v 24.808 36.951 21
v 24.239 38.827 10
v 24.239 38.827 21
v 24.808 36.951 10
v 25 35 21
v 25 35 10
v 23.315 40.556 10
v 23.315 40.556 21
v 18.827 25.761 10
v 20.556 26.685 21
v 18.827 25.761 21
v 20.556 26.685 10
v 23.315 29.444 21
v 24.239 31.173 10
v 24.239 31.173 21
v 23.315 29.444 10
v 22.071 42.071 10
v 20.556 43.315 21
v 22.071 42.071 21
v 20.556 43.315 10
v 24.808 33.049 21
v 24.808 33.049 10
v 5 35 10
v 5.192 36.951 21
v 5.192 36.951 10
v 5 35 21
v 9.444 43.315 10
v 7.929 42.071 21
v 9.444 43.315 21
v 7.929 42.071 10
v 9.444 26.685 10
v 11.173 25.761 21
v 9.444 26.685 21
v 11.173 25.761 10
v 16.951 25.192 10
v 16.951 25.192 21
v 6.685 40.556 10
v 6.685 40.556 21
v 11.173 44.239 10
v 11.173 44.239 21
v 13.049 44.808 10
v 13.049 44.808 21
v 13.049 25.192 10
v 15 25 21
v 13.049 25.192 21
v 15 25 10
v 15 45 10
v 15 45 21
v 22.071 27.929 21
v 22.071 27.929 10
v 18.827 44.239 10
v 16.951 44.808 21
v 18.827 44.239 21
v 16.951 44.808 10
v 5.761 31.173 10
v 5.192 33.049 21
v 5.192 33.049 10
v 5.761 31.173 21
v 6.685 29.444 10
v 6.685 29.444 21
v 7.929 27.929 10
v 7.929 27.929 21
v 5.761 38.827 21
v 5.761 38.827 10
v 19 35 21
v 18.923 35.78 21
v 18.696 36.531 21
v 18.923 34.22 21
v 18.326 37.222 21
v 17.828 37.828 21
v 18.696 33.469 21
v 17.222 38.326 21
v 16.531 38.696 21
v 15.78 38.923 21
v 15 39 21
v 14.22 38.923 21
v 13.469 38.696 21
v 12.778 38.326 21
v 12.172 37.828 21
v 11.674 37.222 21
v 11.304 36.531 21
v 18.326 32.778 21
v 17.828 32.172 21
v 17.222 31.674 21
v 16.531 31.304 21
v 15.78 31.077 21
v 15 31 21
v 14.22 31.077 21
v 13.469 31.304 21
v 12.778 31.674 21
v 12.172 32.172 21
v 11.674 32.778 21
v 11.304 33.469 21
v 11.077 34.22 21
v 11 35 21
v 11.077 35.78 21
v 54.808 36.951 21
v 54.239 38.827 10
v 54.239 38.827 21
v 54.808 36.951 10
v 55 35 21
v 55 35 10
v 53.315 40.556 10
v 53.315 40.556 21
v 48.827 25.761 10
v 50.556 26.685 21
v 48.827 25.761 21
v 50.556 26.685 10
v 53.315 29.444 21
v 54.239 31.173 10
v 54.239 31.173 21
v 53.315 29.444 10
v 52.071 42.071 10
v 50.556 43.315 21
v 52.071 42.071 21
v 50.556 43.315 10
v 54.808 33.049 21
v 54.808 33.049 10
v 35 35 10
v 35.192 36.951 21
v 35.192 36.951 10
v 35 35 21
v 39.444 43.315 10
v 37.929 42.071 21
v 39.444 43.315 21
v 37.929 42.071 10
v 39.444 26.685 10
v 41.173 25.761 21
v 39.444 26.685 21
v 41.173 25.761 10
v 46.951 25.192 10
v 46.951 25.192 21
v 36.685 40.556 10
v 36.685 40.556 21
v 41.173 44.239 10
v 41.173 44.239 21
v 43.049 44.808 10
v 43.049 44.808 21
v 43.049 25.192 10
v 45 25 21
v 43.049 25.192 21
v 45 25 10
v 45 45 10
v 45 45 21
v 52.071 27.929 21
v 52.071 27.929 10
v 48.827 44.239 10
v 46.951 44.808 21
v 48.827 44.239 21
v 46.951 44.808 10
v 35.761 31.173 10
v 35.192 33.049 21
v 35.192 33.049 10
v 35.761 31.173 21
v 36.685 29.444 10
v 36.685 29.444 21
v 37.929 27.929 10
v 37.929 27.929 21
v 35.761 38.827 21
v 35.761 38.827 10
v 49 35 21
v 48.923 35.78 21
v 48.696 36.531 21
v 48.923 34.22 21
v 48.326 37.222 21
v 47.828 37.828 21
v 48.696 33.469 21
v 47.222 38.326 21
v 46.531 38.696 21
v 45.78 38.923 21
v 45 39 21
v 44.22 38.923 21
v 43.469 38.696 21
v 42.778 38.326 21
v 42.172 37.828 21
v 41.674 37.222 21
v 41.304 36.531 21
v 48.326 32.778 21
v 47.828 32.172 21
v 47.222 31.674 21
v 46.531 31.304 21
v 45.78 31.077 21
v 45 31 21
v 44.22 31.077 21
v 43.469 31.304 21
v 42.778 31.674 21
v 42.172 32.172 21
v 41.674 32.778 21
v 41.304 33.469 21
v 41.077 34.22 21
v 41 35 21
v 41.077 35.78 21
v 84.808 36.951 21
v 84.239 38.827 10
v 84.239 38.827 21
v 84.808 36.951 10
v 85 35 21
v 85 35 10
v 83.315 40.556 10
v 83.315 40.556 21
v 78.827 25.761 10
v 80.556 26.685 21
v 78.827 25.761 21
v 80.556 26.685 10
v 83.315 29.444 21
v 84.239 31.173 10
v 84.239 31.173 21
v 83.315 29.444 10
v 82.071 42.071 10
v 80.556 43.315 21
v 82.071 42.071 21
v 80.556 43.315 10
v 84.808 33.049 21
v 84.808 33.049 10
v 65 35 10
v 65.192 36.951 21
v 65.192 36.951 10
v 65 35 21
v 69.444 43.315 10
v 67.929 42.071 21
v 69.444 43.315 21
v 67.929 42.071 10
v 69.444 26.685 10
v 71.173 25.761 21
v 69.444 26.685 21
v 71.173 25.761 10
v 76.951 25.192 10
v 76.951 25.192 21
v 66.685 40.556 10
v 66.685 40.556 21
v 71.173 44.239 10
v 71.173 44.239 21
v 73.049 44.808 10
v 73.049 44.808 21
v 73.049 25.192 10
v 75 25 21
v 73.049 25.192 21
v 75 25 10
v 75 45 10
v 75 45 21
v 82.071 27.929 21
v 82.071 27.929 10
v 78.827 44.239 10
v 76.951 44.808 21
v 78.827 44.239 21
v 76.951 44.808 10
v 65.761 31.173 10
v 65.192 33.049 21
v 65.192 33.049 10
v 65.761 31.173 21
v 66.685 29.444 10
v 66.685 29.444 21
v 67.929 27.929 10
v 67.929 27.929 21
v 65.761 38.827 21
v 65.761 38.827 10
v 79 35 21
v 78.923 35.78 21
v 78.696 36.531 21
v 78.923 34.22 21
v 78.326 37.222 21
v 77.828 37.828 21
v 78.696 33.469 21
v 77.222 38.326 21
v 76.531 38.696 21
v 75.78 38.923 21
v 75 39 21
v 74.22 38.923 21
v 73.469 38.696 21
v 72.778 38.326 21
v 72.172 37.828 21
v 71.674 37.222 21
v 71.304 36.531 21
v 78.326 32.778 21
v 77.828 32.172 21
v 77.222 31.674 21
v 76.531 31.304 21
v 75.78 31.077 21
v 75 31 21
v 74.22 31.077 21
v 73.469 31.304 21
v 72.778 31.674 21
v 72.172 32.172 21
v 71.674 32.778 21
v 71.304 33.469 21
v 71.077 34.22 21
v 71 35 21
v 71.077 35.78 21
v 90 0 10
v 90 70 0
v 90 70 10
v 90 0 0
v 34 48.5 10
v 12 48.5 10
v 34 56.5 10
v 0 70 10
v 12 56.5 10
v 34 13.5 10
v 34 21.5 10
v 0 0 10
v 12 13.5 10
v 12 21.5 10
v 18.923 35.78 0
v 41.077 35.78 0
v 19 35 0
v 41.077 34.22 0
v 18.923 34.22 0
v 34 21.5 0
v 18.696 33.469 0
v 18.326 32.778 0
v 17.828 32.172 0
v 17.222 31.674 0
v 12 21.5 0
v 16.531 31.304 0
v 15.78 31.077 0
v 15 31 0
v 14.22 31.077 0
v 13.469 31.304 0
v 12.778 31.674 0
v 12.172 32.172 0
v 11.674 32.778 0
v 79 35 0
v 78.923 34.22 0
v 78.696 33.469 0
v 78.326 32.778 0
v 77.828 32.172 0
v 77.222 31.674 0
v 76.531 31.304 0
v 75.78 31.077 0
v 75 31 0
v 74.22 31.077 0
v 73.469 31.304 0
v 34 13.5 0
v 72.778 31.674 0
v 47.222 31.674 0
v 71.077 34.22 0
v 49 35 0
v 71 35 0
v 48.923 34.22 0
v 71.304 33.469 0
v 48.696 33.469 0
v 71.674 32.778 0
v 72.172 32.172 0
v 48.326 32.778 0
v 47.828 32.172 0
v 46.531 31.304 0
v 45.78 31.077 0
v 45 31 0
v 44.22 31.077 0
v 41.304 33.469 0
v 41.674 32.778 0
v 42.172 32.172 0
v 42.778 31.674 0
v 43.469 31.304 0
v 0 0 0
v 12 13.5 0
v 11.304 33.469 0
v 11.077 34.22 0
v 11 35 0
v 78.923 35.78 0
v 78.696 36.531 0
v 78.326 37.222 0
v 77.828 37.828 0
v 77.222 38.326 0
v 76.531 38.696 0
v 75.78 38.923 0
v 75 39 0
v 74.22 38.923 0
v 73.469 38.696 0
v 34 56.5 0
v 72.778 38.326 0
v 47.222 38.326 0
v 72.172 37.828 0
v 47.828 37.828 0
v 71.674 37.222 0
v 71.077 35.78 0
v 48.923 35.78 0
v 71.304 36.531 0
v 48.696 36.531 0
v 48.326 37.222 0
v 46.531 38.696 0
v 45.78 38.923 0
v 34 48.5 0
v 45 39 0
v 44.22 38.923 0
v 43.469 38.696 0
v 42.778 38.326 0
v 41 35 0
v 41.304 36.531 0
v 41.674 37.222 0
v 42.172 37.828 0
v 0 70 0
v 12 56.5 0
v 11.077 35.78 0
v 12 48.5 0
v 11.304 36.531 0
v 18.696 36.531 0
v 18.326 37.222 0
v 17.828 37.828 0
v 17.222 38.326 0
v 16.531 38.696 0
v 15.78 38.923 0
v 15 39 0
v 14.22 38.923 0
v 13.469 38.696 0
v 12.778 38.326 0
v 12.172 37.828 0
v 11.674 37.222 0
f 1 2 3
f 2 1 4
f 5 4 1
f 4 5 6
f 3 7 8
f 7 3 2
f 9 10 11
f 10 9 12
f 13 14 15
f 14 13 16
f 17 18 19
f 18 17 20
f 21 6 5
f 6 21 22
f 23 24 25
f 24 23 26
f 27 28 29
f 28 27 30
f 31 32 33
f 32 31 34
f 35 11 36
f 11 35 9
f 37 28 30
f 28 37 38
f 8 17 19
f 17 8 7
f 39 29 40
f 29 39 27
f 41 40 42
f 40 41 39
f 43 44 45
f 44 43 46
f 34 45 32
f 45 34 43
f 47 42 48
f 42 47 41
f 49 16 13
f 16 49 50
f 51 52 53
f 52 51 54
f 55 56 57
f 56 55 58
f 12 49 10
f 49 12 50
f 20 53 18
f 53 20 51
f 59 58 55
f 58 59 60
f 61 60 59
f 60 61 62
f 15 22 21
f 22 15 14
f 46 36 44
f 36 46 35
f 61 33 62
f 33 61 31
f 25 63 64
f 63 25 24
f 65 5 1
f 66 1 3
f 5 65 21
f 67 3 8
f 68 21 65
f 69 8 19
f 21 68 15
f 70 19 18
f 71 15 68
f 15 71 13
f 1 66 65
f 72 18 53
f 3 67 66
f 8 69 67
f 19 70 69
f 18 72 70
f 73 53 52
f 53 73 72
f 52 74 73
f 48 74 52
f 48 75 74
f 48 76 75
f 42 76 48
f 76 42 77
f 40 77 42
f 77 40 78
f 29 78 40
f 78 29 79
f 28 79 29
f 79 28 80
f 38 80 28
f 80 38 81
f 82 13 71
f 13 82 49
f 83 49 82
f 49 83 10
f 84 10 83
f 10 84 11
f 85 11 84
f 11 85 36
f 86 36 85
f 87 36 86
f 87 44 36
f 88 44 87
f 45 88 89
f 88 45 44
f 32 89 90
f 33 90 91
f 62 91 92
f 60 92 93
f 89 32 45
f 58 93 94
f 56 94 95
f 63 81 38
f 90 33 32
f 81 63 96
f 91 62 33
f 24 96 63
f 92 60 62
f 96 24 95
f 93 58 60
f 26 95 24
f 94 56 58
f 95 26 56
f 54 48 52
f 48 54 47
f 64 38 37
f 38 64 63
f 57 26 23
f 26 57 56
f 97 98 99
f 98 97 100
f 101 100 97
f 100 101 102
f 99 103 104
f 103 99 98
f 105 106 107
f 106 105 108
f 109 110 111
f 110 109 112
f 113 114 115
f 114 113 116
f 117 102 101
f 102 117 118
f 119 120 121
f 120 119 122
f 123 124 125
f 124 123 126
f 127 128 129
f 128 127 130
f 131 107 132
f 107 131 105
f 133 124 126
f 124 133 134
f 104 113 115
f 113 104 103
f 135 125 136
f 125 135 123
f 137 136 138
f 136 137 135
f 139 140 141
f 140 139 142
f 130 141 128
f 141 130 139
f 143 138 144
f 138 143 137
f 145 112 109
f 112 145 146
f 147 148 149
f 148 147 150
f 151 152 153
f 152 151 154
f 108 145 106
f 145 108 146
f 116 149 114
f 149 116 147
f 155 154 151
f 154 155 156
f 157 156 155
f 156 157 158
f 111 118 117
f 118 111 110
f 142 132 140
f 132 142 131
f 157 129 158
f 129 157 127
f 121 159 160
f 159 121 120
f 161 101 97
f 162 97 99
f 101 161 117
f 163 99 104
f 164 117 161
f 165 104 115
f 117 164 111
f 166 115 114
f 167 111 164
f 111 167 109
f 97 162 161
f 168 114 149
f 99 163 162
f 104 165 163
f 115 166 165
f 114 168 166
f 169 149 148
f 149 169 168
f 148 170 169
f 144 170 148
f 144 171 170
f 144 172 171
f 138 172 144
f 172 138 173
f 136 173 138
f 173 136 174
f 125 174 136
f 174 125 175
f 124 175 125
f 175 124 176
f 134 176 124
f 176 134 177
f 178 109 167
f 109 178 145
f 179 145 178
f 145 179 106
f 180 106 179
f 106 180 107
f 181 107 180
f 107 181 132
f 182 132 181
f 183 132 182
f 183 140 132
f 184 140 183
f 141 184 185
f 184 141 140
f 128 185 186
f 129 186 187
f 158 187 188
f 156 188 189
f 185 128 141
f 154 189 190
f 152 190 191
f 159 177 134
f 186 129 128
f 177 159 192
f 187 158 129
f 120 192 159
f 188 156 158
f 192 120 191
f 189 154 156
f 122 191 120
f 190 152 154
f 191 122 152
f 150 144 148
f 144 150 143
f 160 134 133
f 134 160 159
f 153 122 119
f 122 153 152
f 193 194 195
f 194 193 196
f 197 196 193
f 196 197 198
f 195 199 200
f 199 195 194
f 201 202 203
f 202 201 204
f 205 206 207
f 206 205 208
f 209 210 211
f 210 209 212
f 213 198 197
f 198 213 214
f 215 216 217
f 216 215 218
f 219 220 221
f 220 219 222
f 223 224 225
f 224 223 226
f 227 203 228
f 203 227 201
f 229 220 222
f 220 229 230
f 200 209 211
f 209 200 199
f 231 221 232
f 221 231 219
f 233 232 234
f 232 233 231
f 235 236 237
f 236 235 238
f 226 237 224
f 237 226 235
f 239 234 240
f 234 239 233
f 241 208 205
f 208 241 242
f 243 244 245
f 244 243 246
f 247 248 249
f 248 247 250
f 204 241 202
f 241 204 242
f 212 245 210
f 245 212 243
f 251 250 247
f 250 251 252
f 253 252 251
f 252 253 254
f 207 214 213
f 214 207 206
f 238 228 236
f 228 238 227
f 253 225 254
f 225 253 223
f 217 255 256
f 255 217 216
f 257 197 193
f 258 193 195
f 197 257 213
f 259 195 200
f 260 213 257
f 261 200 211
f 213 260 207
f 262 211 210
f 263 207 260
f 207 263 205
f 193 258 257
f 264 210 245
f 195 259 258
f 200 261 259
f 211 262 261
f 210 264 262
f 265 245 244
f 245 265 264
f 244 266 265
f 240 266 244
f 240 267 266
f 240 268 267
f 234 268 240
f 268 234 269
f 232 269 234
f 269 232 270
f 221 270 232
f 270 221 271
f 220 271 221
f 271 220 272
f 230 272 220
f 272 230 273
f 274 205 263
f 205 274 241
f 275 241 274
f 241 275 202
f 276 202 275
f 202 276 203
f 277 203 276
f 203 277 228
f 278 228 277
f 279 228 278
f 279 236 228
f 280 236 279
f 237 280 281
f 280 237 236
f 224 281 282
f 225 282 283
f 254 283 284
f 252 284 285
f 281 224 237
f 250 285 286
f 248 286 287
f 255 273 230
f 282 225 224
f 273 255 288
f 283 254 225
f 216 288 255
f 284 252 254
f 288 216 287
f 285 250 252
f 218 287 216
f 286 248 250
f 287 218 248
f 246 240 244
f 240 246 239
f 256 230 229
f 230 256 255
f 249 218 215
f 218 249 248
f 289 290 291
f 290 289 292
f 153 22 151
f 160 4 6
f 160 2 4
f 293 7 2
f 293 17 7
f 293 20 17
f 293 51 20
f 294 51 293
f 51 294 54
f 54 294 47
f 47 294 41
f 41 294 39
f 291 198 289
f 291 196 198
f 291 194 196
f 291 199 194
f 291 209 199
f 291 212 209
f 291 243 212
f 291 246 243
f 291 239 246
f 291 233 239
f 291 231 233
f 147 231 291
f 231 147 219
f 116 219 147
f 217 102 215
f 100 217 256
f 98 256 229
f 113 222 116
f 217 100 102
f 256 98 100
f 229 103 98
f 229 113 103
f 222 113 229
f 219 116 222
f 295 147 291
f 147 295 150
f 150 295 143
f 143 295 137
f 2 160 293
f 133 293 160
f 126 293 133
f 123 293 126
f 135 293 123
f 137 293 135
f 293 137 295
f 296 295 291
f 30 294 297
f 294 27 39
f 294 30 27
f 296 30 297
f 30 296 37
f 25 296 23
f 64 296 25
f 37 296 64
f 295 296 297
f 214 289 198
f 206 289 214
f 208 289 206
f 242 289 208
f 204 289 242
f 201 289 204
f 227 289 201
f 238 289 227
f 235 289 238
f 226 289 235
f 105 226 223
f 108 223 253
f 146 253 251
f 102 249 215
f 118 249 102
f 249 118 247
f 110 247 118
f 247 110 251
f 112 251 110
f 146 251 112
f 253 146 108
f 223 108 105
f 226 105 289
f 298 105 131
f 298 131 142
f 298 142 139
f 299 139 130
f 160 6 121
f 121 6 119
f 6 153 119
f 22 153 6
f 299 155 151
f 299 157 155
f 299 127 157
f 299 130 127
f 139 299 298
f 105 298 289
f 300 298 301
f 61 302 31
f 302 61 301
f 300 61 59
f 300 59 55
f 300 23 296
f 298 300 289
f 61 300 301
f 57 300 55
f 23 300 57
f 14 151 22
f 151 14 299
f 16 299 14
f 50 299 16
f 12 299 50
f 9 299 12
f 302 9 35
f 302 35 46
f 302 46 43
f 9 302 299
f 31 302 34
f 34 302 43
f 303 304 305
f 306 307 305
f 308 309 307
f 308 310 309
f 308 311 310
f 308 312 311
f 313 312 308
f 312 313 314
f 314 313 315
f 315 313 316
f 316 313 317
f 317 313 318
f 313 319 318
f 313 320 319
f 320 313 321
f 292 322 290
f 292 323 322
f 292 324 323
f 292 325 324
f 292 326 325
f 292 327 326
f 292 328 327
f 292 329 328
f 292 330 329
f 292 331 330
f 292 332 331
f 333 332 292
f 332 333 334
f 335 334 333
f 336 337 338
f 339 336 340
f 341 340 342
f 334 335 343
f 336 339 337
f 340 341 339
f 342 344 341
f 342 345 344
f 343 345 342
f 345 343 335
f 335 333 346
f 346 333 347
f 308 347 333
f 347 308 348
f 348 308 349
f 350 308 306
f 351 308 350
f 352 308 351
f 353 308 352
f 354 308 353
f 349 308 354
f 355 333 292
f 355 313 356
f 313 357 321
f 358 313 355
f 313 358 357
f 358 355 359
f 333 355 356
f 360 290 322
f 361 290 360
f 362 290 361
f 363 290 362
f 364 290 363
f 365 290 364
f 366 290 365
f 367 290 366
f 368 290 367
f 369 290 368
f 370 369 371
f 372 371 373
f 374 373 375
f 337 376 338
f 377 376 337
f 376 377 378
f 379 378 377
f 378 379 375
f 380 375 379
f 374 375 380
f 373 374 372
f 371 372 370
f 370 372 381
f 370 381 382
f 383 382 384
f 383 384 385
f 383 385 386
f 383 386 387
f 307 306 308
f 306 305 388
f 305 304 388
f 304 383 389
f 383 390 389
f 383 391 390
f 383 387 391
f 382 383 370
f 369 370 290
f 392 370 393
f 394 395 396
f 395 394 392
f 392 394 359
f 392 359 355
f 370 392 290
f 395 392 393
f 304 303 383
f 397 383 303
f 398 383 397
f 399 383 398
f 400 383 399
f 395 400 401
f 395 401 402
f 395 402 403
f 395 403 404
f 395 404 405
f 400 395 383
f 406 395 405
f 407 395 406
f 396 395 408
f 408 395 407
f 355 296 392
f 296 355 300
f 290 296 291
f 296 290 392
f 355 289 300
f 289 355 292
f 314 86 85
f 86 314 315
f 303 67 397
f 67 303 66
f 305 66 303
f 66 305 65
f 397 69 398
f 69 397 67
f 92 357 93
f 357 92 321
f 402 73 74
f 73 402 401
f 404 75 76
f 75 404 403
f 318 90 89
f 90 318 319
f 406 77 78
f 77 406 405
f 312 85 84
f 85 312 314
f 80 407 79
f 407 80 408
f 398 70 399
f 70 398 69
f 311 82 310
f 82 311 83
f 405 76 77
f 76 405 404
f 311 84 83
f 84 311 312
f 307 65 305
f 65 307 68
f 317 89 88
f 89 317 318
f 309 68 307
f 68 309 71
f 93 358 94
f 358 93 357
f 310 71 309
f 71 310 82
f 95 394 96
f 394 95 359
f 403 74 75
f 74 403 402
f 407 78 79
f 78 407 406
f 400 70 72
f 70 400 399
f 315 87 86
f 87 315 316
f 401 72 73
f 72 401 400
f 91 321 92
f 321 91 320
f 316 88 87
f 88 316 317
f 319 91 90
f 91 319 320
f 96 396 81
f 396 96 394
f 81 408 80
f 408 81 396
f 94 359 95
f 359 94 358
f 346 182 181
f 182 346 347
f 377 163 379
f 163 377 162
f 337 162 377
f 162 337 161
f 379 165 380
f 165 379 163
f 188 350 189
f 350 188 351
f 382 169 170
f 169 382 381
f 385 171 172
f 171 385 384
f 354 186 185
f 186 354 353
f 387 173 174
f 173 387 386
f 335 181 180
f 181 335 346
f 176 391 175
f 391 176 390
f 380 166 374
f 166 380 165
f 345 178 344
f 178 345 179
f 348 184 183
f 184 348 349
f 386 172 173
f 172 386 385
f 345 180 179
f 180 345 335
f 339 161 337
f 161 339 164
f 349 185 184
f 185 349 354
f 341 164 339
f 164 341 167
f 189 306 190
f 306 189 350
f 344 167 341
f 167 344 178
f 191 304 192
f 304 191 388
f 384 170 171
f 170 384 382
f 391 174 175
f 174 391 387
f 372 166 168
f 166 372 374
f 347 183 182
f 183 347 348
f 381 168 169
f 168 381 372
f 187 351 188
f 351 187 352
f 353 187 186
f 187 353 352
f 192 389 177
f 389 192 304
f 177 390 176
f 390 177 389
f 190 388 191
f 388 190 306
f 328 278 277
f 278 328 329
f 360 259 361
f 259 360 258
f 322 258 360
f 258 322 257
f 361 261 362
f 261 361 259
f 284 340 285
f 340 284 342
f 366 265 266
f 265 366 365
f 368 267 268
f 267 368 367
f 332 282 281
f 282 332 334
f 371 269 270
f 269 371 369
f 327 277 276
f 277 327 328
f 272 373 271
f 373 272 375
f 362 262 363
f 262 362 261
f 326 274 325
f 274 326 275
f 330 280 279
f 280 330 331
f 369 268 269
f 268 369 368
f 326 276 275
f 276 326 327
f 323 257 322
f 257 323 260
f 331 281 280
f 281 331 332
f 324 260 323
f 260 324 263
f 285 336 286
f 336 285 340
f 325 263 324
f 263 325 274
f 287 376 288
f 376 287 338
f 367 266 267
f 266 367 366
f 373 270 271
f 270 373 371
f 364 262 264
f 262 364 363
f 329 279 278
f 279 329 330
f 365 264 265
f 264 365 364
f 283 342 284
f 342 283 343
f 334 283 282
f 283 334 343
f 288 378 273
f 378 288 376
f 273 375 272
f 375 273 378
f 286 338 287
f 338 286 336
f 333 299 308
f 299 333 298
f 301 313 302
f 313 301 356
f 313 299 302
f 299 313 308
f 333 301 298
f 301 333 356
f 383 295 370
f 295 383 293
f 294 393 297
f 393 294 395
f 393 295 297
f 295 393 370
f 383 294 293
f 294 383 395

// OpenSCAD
$fn = 32;

// ----------------------------------------------------------------------
// Drill jig: three_boss_slot jig
// ----------------------------------------------------------------------

// --- parameters (mm) ---
plate_l = 90;             // plate length, X
plate_w = 70;             // plate width, Y
plate_t = 10;             // plate thickness
boss_d = 20;              // guide boss diameter
boss_h = 12;              // boss height above the plate
guide_d = 8;              // guide hole diameter
boss_pitch = 30;          // boss pitch
slot_w = 8;               // clamp slot width
slot_l = 22;              // clamp slot length
slot_x = 12;              // slot start X

n_boss = 3;  // guide bosses
boss_x0 = (plate_l - (n_boss - 1) * boss_pitch) / 2;  // first boss X
boss_top = plate_t - 1 + boss_h;  // boss crown height
total_h = boss_top;  // overall height

difference() {
  union() {
  cube([plate_l, plate_w, plate_t]);
  for (i = [0 : n_boss - 1])
    translate([boss_x0 + i * boss_pitch, plate_w / 2, plate_t - 1])
      cylinder(h = boss_h, d = boss_d);
  }
  for (i = [0 : n_boss - 1])
    translate([boss_x0 + i * boss_pitch, plate_w / 2, -1])
      cylinder(h = plate_t + boss_h, d = guide_d);
  for (cy = [plate_w * 0.25, plate_w * 0.75])
    translate([slot_x, cy - slot_w / 2, -1])
      cube([slot_l, slot_w, plate_t + 2]);
}
